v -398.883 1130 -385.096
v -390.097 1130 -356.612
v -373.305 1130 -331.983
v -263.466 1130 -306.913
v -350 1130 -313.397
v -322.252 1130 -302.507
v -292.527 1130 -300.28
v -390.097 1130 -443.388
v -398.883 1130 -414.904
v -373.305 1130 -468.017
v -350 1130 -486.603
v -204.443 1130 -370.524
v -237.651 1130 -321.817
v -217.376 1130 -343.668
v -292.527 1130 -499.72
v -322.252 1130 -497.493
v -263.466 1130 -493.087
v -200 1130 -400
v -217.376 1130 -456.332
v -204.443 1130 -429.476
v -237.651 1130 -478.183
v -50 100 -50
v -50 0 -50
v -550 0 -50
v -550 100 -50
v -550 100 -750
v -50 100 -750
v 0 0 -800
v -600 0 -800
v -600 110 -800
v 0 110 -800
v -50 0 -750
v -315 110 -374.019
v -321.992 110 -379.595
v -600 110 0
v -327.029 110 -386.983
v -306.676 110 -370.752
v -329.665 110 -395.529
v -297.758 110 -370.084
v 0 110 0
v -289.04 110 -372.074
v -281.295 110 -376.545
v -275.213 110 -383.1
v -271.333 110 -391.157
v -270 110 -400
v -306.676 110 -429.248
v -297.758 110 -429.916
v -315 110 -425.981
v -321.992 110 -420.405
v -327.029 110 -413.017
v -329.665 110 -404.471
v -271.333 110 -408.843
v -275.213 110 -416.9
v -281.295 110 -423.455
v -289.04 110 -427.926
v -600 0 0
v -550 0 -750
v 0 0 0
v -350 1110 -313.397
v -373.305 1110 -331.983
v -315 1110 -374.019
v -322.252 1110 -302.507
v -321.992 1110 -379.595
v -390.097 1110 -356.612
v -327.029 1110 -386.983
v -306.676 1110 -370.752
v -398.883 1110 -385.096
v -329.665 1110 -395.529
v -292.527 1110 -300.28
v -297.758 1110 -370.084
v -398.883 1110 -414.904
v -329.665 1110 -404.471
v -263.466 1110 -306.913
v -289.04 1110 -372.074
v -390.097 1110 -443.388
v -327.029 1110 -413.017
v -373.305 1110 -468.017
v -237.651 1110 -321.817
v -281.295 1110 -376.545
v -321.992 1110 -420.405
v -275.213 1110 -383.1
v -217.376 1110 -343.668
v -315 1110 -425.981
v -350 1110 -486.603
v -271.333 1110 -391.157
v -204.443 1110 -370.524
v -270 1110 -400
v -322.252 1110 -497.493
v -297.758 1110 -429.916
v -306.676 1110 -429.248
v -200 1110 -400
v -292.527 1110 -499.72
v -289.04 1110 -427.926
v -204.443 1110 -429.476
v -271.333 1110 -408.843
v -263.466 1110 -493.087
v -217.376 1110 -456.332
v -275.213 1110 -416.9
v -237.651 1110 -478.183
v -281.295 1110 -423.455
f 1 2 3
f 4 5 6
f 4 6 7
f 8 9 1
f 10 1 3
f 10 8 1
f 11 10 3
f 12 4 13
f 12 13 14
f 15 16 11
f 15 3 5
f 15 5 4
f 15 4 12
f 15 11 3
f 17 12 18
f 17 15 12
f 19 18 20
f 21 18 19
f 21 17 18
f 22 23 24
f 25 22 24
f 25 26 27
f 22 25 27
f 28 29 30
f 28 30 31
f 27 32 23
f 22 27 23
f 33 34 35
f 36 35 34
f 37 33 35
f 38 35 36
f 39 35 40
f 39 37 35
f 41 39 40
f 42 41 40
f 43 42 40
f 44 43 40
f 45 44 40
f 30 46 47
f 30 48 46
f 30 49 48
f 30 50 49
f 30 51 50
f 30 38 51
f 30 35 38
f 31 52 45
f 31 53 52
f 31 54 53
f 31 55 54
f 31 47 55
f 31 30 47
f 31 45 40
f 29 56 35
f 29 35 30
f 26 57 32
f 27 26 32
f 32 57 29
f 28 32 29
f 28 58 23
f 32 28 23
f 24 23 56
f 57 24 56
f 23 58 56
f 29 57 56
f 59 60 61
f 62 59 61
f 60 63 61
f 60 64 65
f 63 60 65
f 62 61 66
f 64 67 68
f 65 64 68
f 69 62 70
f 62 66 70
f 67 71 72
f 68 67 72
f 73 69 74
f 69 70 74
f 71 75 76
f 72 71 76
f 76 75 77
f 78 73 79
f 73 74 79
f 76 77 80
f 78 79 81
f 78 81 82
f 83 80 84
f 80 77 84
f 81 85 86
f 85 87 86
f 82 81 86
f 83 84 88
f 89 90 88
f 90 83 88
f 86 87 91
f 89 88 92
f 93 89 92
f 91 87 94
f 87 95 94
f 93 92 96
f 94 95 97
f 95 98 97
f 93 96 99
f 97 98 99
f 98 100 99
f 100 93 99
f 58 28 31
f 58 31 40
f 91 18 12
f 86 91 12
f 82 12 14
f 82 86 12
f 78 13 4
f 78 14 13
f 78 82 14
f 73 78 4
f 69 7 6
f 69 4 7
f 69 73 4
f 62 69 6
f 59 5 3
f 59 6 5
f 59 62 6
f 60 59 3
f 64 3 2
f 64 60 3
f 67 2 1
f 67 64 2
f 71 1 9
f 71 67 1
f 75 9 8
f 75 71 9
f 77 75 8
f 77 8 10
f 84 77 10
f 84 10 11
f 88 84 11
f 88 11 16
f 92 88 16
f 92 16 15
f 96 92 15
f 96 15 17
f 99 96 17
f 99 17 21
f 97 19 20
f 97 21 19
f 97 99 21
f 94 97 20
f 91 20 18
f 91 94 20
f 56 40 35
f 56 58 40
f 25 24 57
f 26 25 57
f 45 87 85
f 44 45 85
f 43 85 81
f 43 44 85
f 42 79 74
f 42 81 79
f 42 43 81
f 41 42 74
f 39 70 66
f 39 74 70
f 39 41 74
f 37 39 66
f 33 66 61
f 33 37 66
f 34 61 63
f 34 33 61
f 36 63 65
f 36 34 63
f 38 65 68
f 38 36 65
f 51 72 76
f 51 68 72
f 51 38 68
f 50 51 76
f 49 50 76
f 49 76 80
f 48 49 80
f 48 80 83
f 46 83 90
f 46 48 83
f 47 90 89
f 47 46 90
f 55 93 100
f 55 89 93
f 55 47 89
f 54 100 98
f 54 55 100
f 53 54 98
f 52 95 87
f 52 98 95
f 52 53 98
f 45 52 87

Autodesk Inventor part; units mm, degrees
ref_plane "YZ Plane" through (0, 0, 0) normal (1, 0, 0) x (0, 1, 0)
ref_plane "XZ Plane" through (0, 0, 0) normal (0, 1, 0) x (-1, 0, 0)
ref_plane "XY Plane" through (0, 0, 0) normal (0, 0, 1) x (1, 0, 0)
sketch "Sketch1" plane through (0, 0, 0) normal (0, 1, 0) x (-1, 0, 0)
  line L0 (0, 0) -> (600, 0)
  line L1 (600, 0) -> (600, -800)
  line L2 (600, -800) -> (0, -800)
  line L3 (0, -800) -> (0, 0)
  line L4 (0, 0) -> (50, 0)
  line L5 (50, 0) -> (50, -50)
  line L6 (50, -50) -> (0, -50)
  line L7 (0, -50) -> (0, 0)
  line L8 (600, -800) -> (550, -800)
  line L9 (550, -800) -> (550, -750)
  line L10 (550, -750) -> (600, -750)
  line L11 (600, -750) -> (600, -800)
  line L12 (50, -50) -> (550, -50)
  line L13 (550, -50) -> (550, -750)
  line L14 (550, -750) -> (50, -750)
  line L15 (50, -750) -> (50, -50)
  dimension "d0" = 800
  dimension "d1" = 600
  dimension "d2" = 50
  dimension "d3" = 50
  dimension "d4" = 50
  dimension "d5" = 50
extrude "Extrusion1" add sketch "Sketch1" along normal blind 100 contours L0 L5 L6 L3 | L0 L1 L10 L13 L12 L5 | L6 L15 L14 L9 L2 L3 | L1 L2 L9 L10
sketch "Sketch2" plane through (0, 100, 0) normal (0, 1, 0) x (1, 0, 0)
  line L0 (-600, 800) -> (-600, 0) projected
  line L1 (0, 0) -> (0, 800) projected
  line L2 (-600, 0) -> (0, 0)
  line L3 (0, 0) -> (0, 800)
  line L4 (0, 800) -> (-600, 800)
  line L5 (-600, 800) -> (-600, 0)
  circle A0 centre (-300, 400) radius 25
  dimension "d8" = 50
extrude "Extrusion2" add sketch "Sketch2" along normal blind 10 contours L4 L1 L2 L0 | A0
sketch "Sketch3" plane through (0, 110, 0) normal (0, 1, 0) x (1, 0, 0)
  line L0 (0, 0) -> (0, 800) projected
  line L1 (0, 800) -> (-600, 800) projected
  line L2 (-600, 800) -> (-600, 0) projected
  line L3 (-600, 0) -> (0, 0) projected
  circle A0 centre (-300, 400) radius 30
  dimension "d11" = 60
extrude "Extrusion3" add sketch "Sketch3" along normal blind 1000 contours A0
sketch "Sketch4" plane through (-300, 1110, -400) normal (0, 1, 0) x (1, 0, 0)
  circle A0 centre (0, 0) radius 30 projected
  circle A1 centre (0, 0) radius 100
  point P0 (300, -400)
  dimension "d14" = 200
extrude "Extrusion4" add sketch "Sketch4" along normal blind 20 contours A0 | A1
properties part number "Corte"
